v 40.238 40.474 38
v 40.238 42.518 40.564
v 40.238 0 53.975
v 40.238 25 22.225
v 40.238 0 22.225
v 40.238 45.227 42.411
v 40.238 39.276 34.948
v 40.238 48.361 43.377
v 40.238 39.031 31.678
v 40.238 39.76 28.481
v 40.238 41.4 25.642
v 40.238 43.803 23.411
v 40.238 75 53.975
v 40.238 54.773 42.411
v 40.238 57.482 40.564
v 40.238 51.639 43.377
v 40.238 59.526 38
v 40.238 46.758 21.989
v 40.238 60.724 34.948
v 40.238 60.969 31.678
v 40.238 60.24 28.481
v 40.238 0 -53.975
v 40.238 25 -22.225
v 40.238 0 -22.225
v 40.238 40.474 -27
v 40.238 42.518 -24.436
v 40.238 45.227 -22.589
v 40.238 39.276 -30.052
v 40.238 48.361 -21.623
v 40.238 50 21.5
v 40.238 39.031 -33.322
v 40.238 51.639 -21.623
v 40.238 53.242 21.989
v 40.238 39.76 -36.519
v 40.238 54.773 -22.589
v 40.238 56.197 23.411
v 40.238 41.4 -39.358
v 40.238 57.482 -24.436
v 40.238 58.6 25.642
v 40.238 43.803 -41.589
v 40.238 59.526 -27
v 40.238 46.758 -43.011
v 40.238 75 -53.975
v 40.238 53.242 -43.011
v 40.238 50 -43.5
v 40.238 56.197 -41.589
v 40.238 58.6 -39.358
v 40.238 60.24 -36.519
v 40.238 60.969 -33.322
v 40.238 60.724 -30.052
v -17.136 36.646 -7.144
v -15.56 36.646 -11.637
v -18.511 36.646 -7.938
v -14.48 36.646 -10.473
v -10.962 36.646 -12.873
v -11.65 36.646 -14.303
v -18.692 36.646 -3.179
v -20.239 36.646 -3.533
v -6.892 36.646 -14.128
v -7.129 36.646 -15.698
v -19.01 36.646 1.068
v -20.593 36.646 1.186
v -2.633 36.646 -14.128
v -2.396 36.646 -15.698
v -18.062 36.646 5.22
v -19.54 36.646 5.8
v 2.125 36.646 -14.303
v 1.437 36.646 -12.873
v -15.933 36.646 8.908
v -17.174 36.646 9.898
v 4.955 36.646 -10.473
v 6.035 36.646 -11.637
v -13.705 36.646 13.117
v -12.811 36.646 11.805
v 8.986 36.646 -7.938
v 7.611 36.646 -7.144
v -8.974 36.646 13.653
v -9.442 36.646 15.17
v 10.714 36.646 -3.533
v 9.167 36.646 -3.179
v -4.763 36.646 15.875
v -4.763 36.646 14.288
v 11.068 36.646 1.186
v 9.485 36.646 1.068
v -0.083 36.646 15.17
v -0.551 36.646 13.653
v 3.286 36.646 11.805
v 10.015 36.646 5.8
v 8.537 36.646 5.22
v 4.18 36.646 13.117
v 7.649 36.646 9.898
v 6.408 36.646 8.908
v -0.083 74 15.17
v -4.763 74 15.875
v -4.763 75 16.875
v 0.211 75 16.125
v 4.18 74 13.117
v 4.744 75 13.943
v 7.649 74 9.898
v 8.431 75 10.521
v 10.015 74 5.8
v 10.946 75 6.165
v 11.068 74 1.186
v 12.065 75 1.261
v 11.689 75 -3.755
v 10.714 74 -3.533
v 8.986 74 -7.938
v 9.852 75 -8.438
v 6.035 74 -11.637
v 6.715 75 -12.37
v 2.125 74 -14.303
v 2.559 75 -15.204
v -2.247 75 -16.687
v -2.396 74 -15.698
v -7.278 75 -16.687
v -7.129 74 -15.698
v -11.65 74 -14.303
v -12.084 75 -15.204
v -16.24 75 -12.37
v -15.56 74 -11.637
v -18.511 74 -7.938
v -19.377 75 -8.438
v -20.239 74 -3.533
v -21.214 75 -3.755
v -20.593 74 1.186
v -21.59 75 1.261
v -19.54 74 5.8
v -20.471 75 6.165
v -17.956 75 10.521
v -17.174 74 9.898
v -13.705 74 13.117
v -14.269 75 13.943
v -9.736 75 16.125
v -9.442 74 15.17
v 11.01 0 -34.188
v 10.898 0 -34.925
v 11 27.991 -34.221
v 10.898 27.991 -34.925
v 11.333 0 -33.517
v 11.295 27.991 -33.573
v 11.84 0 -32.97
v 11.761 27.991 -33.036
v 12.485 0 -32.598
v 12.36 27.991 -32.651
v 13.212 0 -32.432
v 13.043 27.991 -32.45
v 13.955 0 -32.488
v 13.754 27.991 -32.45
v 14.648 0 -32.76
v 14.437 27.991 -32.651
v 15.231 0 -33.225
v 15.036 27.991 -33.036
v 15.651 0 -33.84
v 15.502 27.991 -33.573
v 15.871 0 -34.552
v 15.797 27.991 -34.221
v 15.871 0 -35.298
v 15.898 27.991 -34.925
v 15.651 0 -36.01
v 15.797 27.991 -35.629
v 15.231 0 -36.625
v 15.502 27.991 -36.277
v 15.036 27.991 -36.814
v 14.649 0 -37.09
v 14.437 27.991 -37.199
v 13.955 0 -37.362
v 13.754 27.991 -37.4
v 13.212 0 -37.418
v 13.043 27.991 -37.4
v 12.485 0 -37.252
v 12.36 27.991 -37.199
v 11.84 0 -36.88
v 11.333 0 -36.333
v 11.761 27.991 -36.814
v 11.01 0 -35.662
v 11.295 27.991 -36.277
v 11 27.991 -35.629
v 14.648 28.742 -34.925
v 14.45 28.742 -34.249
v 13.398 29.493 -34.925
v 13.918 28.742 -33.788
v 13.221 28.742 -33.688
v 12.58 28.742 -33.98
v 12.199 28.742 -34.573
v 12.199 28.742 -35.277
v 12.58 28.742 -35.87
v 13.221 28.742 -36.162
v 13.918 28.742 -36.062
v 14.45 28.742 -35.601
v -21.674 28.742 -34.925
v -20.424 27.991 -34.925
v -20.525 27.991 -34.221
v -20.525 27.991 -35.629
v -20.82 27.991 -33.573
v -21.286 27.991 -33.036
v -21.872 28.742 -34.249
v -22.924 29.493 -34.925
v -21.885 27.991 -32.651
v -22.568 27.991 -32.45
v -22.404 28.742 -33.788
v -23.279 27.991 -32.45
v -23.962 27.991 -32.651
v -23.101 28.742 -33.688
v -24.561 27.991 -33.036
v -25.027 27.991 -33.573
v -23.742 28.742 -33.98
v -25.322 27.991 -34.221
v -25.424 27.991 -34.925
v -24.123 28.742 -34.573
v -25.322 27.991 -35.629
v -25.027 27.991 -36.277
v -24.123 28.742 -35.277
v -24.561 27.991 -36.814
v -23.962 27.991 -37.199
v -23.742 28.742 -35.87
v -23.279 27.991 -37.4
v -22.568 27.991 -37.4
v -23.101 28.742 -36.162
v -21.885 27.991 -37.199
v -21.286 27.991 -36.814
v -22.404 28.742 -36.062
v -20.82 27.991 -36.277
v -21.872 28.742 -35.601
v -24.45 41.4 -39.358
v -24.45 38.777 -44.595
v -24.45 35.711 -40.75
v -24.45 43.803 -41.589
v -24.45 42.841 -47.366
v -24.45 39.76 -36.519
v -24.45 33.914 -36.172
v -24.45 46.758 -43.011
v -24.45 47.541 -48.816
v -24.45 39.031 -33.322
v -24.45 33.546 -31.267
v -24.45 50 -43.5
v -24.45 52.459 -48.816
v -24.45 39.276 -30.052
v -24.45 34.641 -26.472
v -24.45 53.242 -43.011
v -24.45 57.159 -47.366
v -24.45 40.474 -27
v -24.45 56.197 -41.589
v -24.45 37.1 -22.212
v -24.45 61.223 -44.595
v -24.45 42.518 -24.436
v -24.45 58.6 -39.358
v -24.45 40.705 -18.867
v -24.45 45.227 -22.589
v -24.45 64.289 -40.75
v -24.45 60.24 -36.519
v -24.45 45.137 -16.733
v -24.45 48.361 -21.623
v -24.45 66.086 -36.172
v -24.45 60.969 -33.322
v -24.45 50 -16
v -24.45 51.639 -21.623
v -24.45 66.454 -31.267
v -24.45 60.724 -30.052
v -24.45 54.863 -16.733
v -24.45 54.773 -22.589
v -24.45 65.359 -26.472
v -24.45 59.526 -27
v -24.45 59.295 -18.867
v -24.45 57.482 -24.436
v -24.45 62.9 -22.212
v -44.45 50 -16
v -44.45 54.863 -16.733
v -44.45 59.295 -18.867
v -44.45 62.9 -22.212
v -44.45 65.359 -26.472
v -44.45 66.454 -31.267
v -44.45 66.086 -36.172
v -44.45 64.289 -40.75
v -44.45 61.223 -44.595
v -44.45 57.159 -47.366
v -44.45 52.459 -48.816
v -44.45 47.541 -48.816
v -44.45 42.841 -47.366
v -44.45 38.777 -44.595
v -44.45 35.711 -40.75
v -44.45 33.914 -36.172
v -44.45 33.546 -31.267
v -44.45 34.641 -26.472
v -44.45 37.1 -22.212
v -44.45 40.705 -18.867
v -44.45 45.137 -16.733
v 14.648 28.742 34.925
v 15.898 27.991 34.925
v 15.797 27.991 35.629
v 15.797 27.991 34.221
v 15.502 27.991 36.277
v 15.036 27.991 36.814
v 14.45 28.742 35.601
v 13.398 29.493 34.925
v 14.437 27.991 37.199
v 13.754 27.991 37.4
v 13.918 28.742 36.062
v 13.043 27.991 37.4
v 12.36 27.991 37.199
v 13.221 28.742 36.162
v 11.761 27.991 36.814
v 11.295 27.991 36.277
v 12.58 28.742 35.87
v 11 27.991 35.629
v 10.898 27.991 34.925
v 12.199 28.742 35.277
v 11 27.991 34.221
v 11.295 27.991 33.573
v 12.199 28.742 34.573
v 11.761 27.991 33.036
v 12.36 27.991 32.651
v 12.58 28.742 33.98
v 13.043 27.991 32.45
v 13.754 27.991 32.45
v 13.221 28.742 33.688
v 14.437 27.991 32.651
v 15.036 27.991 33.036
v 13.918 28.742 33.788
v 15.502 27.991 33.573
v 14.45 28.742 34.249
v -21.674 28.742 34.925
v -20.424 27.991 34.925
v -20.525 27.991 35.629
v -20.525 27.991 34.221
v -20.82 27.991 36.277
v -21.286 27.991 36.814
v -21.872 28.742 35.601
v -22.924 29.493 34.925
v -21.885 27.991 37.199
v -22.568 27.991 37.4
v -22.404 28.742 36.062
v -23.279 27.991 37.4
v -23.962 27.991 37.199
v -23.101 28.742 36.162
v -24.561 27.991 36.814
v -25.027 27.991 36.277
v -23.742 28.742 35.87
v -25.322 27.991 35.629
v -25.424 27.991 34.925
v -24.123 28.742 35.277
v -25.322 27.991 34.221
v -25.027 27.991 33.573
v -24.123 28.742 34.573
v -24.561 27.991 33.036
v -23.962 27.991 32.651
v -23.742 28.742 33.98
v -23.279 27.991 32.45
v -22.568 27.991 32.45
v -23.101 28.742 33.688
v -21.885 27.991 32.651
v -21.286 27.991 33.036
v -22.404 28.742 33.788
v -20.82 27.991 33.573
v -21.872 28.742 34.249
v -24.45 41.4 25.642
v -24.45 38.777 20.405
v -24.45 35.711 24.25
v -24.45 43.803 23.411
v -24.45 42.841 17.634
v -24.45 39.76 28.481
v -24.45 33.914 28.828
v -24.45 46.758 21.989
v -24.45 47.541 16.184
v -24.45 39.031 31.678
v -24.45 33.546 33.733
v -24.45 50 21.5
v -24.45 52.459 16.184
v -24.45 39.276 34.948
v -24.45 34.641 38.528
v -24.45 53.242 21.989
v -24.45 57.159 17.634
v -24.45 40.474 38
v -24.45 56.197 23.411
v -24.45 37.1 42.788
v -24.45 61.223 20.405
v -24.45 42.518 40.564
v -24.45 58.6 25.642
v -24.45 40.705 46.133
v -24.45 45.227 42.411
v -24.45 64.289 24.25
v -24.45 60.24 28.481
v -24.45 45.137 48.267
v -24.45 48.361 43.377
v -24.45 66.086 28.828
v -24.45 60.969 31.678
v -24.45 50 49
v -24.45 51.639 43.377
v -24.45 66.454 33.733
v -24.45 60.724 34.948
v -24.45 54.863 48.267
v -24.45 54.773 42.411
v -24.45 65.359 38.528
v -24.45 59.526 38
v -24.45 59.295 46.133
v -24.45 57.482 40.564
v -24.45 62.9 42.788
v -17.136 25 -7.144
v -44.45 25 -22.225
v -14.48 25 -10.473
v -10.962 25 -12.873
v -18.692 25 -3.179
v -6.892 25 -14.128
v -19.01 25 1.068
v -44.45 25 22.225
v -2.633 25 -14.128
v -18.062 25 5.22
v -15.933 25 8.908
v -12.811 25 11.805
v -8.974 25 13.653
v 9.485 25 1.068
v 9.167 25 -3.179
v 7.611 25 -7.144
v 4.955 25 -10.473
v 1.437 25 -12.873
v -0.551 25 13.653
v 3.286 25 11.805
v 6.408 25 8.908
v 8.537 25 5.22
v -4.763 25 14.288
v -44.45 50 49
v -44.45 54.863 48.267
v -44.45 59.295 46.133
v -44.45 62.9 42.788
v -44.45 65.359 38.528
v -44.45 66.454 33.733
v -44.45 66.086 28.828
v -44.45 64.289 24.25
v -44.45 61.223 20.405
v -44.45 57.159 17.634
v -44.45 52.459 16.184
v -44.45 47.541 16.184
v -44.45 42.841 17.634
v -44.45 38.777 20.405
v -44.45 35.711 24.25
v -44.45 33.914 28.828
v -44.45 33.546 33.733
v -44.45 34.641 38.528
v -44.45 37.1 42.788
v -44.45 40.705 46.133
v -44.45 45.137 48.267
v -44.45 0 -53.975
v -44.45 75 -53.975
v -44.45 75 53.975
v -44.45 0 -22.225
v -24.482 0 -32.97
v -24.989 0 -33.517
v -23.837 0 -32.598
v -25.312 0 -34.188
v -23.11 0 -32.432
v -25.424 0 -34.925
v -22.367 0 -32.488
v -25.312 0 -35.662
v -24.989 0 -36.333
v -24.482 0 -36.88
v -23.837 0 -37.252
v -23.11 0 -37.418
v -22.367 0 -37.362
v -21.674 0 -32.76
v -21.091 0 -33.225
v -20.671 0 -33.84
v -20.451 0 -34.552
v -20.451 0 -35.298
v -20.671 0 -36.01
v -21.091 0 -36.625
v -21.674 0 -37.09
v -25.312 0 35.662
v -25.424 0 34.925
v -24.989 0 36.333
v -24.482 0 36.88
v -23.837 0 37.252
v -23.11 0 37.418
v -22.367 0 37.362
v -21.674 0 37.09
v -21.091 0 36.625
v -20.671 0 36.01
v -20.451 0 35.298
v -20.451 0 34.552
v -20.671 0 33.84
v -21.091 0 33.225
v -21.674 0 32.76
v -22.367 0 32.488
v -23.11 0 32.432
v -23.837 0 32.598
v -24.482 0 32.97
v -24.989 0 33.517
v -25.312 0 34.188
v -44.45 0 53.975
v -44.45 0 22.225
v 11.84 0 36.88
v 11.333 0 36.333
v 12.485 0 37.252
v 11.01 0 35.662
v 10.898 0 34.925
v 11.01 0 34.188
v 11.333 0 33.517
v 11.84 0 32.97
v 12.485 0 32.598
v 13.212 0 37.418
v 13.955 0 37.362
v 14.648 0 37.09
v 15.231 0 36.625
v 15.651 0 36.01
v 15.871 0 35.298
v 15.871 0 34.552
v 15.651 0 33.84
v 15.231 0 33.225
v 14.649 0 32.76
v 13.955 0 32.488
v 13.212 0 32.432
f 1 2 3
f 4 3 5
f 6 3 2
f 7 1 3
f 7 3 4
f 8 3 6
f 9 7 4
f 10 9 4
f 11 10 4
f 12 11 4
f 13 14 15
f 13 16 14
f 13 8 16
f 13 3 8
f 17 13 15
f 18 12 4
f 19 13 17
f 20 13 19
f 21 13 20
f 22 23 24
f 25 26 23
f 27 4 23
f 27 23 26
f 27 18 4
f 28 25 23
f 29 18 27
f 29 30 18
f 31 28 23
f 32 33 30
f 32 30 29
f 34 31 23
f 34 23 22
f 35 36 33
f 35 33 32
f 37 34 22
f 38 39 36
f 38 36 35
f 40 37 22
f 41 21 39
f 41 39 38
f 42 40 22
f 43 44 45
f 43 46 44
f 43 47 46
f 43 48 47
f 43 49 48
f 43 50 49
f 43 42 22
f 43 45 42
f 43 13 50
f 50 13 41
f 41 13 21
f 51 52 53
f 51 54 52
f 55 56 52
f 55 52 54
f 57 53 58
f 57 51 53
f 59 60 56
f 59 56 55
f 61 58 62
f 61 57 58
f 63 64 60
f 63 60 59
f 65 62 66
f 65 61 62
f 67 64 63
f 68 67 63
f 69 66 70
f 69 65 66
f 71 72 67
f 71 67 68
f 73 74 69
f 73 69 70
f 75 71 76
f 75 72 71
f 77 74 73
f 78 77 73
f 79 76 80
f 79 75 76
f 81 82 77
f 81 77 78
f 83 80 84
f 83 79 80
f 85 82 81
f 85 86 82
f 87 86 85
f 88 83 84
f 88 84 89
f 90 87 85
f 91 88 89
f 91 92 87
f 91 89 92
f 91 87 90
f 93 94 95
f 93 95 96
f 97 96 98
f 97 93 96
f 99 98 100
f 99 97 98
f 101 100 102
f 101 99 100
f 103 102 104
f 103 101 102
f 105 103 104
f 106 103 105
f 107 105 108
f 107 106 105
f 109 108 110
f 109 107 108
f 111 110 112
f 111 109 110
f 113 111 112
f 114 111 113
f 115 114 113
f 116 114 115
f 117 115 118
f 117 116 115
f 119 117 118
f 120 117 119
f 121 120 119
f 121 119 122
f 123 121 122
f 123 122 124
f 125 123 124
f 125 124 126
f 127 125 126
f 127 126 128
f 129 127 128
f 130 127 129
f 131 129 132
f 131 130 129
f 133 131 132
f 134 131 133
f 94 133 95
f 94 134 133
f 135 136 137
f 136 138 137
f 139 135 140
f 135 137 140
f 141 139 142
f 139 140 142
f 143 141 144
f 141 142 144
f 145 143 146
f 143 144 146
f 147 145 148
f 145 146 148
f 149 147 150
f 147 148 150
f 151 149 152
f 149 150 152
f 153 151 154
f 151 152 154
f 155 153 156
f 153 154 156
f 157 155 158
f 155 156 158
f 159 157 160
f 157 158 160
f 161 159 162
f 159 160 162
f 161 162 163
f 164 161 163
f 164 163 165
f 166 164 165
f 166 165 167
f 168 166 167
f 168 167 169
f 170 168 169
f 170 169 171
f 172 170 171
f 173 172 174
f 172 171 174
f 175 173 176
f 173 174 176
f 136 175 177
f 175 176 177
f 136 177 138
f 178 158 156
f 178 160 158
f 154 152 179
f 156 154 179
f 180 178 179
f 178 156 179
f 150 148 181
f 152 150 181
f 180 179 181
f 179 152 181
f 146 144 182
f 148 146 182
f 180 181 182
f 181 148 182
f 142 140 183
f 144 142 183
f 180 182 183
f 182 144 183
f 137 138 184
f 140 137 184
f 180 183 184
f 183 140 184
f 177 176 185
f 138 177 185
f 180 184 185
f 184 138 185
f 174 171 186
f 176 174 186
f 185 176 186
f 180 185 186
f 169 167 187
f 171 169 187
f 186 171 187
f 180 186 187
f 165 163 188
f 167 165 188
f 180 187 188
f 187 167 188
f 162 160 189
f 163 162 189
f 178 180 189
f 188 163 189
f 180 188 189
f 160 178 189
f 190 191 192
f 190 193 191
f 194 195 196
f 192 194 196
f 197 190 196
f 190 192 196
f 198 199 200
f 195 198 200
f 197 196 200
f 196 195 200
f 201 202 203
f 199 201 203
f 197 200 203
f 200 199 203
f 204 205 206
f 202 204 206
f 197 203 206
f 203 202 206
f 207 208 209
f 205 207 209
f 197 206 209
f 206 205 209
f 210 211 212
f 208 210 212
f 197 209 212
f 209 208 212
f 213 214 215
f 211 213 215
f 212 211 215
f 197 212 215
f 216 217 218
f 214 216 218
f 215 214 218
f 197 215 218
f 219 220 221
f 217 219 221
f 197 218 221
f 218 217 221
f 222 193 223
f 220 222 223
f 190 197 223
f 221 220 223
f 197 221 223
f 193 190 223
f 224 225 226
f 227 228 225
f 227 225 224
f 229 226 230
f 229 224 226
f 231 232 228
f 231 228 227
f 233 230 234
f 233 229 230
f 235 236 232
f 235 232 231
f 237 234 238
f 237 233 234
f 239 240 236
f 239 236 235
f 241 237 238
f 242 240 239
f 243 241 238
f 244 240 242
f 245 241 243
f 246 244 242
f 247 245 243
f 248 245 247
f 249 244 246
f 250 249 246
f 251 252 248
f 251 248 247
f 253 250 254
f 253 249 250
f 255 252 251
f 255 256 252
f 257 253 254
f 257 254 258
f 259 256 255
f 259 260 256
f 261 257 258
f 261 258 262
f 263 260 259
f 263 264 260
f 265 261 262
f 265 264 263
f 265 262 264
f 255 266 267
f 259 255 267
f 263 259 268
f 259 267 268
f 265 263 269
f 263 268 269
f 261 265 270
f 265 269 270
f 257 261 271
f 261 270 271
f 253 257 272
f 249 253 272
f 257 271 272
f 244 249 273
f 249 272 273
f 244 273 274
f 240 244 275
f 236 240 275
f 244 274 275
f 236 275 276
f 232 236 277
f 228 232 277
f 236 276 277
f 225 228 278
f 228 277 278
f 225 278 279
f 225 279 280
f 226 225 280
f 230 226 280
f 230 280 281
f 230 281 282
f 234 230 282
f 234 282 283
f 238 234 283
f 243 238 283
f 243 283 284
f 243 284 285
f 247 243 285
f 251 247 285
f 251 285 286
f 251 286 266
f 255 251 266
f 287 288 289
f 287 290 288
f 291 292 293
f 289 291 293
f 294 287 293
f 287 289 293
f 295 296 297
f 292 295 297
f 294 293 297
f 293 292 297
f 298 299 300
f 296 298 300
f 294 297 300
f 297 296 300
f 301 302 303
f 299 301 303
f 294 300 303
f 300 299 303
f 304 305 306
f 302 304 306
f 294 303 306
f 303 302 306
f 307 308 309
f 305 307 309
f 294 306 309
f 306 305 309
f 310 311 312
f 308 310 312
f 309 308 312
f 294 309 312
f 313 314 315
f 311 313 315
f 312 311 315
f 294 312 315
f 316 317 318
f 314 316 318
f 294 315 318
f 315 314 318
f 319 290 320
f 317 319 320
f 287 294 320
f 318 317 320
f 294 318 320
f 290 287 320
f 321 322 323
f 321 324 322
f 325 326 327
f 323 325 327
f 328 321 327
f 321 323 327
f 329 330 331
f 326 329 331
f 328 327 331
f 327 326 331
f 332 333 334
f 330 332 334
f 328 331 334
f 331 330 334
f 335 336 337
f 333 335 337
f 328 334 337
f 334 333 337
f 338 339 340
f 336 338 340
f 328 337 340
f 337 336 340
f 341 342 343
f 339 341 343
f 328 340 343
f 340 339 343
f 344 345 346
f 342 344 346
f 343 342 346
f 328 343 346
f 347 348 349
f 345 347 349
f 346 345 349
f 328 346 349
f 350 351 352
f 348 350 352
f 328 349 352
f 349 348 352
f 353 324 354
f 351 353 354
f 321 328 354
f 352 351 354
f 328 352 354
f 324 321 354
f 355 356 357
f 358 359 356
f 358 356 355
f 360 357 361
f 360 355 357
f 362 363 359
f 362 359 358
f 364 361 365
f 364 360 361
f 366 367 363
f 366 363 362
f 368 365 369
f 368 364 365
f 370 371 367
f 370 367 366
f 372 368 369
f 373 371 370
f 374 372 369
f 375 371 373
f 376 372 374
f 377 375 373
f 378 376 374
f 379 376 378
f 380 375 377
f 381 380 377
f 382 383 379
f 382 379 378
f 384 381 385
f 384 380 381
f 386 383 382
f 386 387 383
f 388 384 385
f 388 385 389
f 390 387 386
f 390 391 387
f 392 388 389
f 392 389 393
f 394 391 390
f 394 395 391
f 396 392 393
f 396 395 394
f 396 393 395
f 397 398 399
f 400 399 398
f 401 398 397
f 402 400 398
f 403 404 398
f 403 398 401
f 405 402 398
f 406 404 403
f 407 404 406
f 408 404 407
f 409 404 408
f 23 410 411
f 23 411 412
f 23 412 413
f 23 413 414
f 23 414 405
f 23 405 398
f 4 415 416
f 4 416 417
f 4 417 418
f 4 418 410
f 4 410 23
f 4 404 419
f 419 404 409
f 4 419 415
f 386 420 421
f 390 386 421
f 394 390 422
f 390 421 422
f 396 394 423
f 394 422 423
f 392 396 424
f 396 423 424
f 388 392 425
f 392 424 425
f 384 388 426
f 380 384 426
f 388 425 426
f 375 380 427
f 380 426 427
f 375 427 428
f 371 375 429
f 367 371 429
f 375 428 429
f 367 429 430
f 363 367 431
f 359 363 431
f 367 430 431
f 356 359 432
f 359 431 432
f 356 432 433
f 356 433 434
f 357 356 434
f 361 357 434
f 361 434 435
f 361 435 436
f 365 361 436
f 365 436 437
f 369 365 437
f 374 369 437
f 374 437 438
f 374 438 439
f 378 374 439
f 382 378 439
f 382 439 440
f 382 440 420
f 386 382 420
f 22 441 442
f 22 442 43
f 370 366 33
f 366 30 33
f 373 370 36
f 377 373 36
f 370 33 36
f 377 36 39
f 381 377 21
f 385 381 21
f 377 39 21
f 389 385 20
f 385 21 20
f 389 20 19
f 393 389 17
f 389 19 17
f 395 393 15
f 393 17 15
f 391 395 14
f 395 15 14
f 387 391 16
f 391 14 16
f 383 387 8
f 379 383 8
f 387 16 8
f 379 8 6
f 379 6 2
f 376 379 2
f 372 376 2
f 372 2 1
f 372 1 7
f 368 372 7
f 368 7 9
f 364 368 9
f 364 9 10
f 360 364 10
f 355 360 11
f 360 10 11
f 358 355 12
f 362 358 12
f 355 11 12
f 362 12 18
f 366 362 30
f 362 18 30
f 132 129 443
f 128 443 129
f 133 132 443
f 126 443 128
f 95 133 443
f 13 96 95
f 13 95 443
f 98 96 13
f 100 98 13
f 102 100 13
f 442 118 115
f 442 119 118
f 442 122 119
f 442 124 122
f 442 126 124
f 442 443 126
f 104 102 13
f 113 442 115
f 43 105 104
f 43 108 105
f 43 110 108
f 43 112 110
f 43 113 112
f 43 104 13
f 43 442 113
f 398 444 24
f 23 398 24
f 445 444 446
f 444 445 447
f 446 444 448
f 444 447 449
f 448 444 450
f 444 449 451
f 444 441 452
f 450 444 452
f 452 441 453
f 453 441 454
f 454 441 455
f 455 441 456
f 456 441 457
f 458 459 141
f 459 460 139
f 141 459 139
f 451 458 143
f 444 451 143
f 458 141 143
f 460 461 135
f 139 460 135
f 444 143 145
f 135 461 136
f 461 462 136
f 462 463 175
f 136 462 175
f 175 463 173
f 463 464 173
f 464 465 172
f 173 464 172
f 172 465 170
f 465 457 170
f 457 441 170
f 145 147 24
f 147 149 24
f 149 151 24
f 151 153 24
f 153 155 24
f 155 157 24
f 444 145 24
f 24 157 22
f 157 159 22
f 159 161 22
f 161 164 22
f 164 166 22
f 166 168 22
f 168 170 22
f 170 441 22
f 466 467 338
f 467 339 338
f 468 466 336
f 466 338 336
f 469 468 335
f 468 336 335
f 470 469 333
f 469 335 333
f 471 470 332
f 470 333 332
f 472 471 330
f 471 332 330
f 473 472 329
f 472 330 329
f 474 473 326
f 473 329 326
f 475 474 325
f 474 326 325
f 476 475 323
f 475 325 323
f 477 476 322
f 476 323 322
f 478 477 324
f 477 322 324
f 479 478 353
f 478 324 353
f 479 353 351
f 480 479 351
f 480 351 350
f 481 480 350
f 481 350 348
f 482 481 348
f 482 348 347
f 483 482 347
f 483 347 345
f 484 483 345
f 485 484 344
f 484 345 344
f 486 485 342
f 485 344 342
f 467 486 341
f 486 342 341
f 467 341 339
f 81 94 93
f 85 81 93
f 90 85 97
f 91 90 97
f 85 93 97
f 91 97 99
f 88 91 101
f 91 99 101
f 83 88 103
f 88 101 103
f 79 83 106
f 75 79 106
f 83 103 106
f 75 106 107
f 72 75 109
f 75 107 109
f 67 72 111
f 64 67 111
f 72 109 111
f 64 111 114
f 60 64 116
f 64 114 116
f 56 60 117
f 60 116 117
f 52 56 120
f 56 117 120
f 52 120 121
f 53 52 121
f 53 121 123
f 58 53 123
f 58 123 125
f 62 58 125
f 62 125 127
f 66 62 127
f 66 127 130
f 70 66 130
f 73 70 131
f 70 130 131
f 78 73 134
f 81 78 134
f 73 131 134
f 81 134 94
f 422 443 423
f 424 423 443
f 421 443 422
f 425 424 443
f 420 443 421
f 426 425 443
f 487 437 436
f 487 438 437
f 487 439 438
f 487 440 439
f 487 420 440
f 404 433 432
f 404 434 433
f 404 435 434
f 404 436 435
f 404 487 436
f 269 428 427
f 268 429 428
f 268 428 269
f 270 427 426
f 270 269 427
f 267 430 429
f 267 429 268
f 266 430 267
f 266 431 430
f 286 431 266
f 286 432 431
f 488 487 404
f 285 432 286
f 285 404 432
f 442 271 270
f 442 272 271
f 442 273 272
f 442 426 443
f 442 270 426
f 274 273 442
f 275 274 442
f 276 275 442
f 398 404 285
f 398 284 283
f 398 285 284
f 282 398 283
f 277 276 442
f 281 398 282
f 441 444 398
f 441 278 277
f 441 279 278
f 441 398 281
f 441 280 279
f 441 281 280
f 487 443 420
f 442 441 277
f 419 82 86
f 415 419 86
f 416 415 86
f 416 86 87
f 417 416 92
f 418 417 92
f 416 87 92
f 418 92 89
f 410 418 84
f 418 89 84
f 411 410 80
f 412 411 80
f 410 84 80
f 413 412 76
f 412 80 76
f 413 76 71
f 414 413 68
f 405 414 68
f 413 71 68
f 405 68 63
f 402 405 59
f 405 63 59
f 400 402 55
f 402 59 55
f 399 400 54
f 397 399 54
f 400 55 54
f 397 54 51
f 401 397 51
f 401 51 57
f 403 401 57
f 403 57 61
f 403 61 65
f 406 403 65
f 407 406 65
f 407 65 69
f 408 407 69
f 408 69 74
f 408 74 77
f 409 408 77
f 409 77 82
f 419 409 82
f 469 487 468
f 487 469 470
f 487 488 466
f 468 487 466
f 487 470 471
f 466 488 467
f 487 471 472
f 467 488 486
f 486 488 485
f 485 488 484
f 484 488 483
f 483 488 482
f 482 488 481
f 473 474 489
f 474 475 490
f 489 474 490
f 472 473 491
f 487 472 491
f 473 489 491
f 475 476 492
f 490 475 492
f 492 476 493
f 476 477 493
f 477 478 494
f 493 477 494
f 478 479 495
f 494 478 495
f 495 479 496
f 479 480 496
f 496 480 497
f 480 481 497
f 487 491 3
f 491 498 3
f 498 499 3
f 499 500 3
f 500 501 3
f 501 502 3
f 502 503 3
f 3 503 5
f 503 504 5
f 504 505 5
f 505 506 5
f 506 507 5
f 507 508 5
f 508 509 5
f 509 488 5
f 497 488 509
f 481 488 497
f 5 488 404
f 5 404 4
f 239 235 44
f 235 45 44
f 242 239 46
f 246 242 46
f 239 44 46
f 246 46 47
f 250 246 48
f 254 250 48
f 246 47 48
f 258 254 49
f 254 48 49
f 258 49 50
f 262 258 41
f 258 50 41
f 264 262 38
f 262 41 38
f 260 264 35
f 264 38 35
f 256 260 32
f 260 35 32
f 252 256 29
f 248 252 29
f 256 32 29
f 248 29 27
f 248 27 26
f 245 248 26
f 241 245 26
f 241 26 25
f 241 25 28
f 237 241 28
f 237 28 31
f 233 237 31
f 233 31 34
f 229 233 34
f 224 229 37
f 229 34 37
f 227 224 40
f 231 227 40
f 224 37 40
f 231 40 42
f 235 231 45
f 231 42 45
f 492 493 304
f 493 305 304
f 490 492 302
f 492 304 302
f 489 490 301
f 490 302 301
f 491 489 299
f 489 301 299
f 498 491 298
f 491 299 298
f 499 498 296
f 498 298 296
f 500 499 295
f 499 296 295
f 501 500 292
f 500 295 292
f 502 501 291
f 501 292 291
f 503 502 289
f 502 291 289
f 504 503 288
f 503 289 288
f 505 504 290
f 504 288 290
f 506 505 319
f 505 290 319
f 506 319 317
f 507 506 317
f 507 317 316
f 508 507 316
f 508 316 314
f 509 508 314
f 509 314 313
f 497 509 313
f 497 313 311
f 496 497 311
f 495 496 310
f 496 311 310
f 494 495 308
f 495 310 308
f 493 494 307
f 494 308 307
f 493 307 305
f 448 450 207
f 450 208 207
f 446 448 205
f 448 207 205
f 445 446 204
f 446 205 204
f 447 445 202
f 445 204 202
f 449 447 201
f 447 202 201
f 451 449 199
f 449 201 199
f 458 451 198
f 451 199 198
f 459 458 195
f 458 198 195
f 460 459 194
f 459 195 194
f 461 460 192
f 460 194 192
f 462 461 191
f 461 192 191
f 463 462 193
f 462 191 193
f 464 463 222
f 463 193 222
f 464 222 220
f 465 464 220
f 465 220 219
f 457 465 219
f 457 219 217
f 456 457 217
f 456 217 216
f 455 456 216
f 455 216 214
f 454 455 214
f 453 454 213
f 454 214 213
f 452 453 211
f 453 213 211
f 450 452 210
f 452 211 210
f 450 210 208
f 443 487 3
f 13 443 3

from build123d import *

# Parameters (mm, degrees)
SKETCH1_W                       = 88.9
SKETCH1_H                       = 107.95
EXTRUDE1_DEPTH                  = 75
SKETCH2_R                       = 14.2875
EXTRUDE2_DEPTH                  = 203.2
M6_TAPPED_HOLE1_D               = 5
M6_TAPPED_HOLE1_DEPTH           = 27.9908
M6_TAPPED_HOLE1_TIP             = 1.502151548
SKETCH6_R                       = 15.875
EXTRUDE4_DEPTH                  = 38.354
SKETCH7_W                       = 88.9
SKETCH7_H                       = 44.45
EXTRUDE5_DEPTH                  = 25
SKETCH8_W                       = 4.2125
SKETCH8_H                       = 107.95
EXTRUDE6_DEPTH                  = 103.538300771
CBORE_FOR_M20_SHCS1_D           = 22
CBORE_FOR_M20_SHCS1_CBORE_D     = 33
CBORE_FOR_M20_SHCS1_CBORE_DEPTH = 20
CHAMFER1_SIZE                   = 1


with BuildPart() as part:
    # Sketch1 → Extrude1 (new body)
    with BuildSketch(Plane(origin=(0, 0, 0), x_dir=(1, 0, 0), z_dir=(0, 1, 0))):
        Rectangle(SKETCH1_W, SKETCH1_H)
    extrude(amount=EXTRUDE1_DEPTH)

    # Sketch2 → Extrude2 (cut)
    with BuildSketch(Plane(origin=(0, 75, 0), x_dir=(1, 0, 0), z_dir=(0, 1, 0))):
        with Locations(Location((-4.7625, 0, 0), (0, 0, 270))):
            Circle(SKETCH2_R)
    extrude(amount=-EXTRUDE2_DEPTH, mode=Mode.SUBTRACT)

    # M6 Tapped Hole1
    with Locations(Plane.XZ):
        with Locations((-22.9235, 34.925), (13.3985, 34.925), (-22.9235, -34.925), (13.3985, -34.925)):
            Hole(M6_TAPPED_HOLE1_D / 2, depth=M6_TAPPED_HOLE1_DEPTH)
            with Locations((0, 0, -(M6_TAPPED_HOLE1_DEPTH + M6_TAPPED_HOLE1_TIP / 2))):  # 118° drill point
                Cone(0, M6_TAPPED_HOLE1_D / 2, M6_TAPPED_HOLE1_TIP, mode=Mode.SUBTRACT)

    # Sketch6 → Extrude4 (cut)
    with BuildSketch(Plane(origin=(0, 75, 0), x_dir=(1, 0, 0), z_dir=(0, 1, 0))):
        with Locations(Location((-4.7625, 0, 0), (0, 0, 270))):
            Circle(SKETCH6_R)
    extrude(amount=-EXTRUDE4_DEPTH, mode=Mode.SUBTRACT)

    # Sketch7 → Extrude5 (cut)
    with BuildSketch(Plane.XZ):
        Rectangle(SKETCH7_W, SKETCH7_H)
    extrude(amount=-EXTRUDE5_DEPTH, mode=Mode.SUBTRACT)

    # Sketch8 → Extrude6 (cut, through all)
    with BuildSketch(Plane(origin=(0, 75, 0), x_dir=(1, 0, 0), z_dir=(0, 1, 0))):
        with Locations((42.34375, 0)):
            Rectangle(SKETCH8_W, SKETCH8_H)
    extrude(amount=-EXTRUDE6_DEPTH, mode=Mode.SUBTRACT)

    # CBORE for M20 SHCS1 (through all)
    with Locations(Plane.ZY.offset(44.45)):
        with Locations((32.5, 50), (-32.5, 50)):
            CounterBoreHole(CBORE_FOR_M20_SHCS1_D / 2, CBORE_FOR_M20_SHCS1_CBORE_D / 2, CBORE_FOR_M20_SHCS1_CBORE_DEPTH)

    # Chamfer1
    chamfer1_edges = [part.edges().sort_by_distance(p)[0] for p in [
        (-4.7625, 75, -15.875),
    ]]
    chamfer(chamfer1_edges, length=CHAMFER1_SIZE)


solid = part.part
